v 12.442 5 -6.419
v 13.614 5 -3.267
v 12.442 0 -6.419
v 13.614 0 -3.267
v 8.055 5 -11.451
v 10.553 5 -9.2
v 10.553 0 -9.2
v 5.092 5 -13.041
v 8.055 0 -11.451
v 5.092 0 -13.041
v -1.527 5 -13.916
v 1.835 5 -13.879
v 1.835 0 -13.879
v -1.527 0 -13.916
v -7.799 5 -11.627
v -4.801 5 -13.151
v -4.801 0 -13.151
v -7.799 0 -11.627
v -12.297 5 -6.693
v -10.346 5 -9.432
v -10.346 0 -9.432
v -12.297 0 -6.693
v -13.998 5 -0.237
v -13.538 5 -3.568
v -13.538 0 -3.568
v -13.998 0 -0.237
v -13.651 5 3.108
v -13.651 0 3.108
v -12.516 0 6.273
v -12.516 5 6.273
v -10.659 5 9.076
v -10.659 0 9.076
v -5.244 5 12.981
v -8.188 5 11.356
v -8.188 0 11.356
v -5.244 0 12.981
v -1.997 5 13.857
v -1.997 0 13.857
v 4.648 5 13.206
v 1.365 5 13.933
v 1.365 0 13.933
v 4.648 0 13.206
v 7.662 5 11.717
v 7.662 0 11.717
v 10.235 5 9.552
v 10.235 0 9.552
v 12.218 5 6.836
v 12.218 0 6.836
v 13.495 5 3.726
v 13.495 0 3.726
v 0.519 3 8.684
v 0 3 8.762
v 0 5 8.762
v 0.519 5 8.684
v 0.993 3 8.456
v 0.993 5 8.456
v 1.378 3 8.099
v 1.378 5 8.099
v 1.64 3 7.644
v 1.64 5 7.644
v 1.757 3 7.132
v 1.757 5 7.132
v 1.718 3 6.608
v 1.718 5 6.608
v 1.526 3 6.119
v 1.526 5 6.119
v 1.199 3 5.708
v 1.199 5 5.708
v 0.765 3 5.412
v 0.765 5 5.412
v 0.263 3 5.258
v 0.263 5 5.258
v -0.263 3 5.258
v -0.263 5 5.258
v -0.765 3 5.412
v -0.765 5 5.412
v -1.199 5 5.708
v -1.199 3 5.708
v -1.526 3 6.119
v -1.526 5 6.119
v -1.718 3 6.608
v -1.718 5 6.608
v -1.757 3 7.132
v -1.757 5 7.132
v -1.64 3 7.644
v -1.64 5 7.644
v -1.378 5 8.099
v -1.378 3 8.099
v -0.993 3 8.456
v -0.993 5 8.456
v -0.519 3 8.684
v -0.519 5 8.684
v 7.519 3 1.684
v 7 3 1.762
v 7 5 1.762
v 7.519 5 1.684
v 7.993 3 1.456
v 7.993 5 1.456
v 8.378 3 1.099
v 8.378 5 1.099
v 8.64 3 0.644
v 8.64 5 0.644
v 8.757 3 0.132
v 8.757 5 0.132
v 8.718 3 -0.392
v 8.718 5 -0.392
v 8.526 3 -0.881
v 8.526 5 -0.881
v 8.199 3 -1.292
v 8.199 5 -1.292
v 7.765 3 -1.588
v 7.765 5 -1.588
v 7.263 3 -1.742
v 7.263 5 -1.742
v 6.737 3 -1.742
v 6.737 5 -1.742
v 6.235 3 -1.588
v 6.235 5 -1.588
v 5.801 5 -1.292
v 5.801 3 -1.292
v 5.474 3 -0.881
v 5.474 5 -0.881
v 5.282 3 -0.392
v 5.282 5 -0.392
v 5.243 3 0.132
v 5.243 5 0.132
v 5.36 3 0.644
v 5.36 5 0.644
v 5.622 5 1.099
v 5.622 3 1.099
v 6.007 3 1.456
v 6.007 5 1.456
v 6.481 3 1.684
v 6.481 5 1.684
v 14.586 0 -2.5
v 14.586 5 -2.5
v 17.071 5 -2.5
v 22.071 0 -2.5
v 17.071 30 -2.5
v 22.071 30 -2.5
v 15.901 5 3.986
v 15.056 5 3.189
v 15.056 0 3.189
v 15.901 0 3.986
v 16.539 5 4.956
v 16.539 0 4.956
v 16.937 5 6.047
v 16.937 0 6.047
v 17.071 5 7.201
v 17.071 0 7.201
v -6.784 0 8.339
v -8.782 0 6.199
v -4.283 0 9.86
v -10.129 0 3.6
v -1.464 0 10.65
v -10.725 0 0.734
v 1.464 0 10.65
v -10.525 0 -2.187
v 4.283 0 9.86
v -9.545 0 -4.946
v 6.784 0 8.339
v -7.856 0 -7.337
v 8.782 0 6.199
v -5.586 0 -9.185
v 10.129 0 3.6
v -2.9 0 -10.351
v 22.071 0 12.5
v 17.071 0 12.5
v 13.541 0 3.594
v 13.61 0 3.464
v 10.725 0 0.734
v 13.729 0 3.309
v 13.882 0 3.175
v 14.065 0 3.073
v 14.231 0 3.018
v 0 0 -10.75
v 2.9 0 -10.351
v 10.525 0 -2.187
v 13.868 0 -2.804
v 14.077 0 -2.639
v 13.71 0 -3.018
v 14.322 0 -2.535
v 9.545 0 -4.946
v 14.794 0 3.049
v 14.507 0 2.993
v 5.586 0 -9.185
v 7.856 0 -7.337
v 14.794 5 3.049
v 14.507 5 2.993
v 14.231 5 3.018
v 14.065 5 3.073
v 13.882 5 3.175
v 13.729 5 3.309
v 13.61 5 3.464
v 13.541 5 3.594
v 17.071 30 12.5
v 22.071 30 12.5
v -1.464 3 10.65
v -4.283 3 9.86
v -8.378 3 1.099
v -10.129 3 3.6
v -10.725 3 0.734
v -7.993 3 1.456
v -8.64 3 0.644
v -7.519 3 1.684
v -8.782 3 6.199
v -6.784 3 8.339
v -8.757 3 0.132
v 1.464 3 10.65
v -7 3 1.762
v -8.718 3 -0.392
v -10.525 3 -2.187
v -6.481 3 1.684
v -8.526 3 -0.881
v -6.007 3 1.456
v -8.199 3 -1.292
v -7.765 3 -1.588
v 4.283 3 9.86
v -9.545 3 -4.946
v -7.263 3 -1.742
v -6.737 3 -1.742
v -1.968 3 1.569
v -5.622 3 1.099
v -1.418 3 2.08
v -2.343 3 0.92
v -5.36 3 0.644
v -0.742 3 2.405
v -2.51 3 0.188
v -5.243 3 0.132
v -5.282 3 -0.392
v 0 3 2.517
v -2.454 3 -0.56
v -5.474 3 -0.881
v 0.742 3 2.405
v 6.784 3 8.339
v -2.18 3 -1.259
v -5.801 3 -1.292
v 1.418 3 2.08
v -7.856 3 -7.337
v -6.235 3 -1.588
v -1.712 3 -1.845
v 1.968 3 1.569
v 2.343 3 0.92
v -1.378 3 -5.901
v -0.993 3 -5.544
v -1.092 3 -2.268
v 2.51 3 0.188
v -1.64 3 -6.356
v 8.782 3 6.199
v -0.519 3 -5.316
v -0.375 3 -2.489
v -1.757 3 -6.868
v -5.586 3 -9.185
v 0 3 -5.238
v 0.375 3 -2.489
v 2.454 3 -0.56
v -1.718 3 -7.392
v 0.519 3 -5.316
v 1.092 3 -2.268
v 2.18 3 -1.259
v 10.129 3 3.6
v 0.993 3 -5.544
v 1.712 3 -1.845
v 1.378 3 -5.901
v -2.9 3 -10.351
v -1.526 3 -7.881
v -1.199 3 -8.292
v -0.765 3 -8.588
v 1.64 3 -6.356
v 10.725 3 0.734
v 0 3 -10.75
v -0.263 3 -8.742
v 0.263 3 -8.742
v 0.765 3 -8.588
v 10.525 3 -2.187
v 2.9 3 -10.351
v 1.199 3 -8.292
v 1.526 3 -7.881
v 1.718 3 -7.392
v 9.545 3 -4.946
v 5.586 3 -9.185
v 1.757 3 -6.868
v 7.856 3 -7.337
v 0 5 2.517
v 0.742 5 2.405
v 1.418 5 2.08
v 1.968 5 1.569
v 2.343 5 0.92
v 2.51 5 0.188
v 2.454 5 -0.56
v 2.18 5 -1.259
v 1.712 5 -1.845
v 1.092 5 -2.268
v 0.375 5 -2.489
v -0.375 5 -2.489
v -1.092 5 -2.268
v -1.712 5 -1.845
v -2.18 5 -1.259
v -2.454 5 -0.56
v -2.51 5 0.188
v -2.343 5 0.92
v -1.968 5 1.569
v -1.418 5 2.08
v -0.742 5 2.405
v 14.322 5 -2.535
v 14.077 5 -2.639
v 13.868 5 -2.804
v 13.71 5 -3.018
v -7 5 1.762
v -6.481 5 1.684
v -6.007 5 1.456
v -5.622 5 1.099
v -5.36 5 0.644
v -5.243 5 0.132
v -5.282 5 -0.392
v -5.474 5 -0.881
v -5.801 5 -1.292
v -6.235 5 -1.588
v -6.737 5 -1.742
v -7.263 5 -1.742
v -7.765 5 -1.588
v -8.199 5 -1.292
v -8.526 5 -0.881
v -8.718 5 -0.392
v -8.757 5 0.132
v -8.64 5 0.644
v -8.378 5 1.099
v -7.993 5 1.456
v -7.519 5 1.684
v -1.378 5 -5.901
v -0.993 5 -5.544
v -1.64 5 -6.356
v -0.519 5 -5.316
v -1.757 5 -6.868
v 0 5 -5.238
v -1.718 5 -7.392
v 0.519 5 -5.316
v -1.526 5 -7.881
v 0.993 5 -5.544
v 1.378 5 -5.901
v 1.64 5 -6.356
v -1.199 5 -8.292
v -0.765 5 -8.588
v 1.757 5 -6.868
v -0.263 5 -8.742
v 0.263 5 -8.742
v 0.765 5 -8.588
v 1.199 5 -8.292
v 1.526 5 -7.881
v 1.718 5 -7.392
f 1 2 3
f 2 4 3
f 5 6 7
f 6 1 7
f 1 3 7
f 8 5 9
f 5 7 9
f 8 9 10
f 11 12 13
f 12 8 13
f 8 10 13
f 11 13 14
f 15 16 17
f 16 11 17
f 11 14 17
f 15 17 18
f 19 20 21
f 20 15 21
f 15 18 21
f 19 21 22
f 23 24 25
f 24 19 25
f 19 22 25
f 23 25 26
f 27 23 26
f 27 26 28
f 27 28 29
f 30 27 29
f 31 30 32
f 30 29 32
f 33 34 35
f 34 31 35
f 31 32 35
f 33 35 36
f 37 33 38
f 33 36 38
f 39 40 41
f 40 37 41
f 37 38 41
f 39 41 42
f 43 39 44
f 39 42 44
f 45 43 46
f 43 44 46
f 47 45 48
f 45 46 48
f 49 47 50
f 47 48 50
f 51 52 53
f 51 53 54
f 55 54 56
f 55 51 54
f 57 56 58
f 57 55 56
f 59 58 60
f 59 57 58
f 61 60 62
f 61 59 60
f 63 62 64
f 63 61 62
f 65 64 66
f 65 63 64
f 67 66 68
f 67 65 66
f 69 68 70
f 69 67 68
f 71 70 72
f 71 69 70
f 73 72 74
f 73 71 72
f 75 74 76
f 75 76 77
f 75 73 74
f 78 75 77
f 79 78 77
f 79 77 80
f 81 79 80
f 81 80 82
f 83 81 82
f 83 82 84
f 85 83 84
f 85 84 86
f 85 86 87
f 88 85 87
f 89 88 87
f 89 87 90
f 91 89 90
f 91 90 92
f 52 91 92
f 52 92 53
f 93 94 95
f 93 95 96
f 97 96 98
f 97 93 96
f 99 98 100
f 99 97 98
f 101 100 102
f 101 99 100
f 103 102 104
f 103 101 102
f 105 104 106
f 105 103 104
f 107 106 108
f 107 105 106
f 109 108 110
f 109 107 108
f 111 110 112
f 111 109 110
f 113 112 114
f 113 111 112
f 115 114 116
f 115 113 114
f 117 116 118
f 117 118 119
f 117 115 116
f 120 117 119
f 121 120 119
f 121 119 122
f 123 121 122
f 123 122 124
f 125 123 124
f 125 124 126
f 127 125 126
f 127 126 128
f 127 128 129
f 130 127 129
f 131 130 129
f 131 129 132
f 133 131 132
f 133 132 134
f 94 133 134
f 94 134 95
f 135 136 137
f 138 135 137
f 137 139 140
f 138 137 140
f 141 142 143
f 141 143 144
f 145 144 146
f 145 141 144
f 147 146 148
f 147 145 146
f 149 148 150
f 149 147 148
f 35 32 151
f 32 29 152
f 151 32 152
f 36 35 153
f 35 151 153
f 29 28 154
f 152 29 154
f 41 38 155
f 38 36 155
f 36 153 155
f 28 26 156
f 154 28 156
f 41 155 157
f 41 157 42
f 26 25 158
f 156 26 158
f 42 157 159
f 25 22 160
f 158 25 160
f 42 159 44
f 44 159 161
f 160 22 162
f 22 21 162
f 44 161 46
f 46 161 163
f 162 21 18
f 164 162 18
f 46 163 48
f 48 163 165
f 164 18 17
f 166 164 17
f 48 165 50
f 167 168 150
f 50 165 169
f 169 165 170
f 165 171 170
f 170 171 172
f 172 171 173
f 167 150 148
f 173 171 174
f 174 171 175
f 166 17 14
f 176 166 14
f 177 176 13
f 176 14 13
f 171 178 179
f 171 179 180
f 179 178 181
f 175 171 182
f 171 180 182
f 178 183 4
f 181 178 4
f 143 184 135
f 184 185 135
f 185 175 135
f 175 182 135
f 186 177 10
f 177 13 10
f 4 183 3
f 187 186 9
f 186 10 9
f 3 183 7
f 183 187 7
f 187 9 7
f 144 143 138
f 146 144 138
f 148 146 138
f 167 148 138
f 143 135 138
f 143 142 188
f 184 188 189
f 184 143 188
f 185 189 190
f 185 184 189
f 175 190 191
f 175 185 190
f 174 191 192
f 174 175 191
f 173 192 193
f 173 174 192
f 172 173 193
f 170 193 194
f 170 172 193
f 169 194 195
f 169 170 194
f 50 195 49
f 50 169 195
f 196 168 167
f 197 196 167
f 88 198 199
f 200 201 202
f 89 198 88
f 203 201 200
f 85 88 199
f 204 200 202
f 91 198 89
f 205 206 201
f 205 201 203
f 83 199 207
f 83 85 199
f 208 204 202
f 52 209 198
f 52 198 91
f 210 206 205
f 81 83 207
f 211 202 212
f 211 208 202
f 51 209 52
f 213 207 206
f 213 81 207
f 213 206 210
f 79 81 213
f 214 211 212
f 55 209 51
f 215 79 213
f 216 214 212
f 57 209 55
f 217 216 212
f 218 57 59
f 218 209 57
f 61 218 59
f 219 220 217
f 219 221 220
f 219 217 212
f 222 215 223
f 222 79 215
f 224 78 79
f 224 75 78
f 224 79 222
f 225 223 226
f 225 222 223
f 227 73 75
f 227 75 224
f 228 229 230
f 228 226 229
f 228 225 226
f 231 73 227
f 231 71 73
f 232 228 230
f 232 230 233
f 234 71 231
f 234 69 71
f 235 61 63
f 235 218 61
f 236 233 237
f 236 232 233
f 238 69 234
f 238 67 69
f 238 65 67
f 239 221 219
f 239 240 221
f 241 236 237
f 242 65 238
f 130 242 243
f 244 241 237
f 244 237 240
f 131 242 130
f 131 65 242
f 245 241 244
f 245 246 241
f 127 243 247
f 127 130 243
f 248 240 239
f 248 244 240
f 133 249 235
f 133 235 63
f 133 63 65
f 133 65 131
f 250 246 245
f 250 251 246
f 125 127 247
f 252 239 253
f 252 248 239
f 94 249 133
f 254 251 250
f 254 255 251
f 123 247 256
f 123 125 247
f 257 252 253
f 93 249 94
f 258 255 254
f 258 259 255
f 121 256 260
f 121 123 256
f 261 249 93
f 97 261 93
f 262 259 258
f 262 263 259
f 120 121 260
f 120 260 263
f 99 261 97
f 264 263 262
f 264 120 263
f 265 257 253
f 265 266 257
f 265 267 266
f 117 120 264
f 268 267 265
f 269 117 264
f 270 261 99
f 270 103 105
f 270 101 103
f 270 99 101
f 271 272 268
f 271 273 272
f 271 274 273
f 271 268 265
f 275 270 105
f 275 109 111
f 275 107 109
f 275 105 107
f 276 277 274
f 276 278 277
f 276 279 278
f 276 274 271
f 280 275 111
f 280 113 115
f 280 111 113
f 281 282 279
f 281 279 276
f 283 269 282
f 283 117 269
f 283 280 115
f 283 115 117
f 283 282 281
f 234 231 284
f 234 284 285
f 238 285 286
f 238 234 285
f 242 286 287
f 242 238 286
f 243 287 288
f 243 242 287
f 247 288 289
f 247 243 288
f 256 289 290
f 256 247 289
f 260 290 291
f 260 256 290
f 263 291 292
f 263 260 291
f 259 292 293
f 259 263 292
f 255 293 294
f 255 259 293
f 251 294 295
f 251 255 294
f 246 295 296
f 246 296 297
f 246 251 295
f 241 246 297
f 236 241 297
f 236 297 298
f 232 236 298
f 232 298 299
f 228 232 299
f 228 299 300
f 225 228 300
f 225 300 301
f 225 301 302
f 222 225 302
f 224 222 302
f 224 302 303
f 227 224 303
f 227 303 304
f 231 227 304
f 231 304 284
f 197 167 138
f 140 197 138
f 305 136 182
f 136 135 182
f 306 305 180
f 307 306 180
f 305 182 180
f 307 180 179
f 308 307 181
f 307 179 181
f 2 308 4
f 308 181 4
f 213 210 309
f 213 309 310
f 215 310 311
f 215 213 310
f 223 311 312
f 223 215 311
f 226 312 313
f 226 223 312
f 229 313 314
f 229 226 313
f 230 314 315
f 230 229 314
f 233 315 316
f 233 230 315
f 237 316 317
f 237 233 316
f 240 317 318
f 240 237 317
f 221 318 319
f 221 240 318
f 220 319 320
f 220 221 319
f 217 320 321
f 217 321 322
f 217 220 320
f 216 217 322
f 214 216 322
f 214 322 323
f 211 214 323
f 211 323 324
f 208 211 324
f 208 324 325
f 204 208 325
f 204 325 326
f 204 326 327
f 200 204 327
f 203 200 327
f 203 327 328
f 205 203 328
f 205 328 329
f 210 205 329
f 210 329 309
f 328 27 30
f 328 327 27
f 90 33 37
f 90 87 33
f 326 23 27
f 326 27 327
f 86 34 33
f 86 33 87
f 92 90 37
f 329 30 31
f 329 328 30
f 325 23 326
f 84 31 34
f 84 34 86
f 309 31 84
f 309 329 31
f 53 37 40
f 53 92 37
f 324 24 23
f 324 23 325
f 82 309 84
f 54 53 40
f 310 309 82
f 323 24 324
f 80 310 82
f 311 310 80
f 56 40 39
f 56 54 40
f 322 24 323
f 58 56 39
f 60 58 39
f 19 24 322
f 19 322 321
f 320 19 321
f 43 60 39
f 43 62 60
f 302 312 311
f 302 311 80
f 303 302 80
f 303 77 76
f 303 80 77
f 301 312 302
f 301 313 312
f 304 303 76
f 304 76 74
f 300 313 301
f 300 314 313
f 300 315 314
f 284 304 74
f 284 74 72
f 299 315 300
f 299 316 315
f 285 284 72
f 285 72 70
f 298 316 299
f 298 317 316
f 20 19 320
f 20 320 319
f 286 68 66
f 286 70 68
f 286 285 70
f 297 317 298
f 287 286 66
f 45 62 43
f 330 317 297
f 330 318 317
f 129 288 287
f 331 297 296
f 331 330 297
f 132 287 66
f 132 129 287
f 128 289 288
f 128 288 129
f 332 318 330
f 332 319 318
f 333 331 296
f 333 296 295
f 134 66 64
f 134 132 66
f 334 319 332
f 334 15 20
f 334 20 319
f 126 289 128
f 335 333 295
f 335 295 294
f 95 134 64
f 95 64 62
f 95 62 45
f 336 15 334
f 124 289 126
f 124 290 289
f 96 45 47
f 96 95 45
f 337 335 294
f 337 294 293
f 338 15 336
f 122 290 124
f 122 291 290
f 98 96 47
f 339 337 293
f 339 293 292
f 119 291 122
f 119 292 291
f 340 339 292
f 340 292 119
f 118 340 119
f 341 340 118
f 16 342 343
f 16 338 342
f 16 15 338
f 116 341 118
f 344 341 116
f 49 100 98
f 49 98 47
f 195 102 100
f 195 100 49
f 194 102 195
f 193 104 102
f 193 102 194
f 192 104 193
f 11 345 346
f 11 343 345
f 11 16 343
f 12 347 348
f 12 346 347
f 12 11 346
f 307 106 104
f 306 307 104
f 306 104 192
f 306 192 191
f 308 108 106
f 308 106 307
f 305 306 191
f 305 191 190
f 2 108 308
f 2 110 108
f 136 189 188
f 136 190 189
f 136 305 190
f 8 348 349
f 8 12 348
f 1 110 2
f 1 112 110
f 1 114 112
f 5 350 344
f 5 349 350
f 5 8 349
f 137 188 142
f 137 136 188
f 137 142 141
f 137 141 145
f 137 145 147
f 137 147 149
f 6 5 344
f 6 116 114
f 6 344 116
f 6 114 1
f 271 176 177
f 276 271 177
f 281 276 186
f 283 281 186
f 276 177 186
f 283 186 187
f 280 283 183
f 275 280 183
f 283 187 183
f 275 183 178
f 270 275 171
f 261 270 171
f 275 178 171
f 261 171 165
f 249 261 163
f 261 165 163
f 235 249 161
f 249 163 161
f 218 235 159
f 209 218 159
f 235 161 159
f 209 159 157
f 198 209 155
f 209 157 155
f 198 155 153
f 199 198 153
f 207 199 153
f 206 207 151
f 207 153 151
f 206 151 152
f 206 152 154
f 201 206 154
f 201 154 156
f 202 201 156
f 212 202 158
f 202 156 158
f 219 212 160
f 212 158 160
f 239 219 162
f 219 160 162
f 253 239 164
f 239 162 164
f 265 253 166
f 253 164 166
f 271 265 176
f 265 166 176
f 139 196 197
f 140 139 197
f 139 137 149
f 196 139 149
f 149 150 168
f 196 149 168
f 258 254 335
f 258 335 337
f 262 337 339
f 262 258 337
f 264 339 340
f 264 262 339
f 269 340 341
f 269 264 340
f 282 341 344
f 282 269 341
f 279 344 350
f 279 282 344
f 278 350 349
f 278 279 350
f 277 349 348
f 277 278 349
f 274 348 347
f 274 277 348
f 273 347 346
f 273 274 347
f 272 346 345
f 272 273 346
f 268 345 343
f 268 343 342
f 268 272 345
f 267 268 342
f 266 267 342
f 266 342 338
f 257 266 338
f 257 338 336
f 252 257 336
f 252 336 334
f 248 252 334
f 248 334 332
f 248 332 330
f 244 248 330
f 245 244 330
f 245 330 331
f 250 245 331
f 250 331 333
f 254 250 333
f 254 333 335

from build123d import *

# Parameters (mm, degrees)
SKETCH1_R           = 14
SKETCH1_R_2         = 2.517260593
SKETCH1_R_3         = 1.762082415
BOSS_EXTRUDE1_DEPTH = 5
SKETCH4_W           = 12
SKETCH4_H           = 5
BOSS_EXTRUDE4_DEPTH = 5
SKETCH6_W           = 5
SKETCH6_H           = 15
BOSS_EXTRUDE5_DEPTH = 30
SKETCH8_R           = 10.75
CUT_EXTRUDE2_DEPTH  = 3
FILLET1_R           = 5
FILLET2_R           = 1


with BuildPart() as part:
    # Sketch1 → Boss-Extrude1 (new body)
    with BuildSketch(Plane(origin=(0, 0, 0), x_dir=(1, 0, 0), z_dir=(0, 1, 0))):
        with Locations(Location((0, 0, 0), (0, 0, 270))):
            Circle(SKETCH1_R)
        with Locations(Location((0, 0, 0), (0, 0, 270))):
            Circle(SKETCH1_R_2, mode=Mode.SUBTRACT)
        with Locations(Location((0, 7, 0), (0, 0, 270))):
            Circle(SKETCH1_R_3, mode=Mode.SUBTRACT)
        with Locations(Location((7, 0, 0), (0, 0, 270))):
            Circle(SKETCH1_R_3, mode=Mode.SUBTRACT)
        with Locations(Location((0, -7, 0), (0, 0, 270))):
            Circle(SKETCH1_R_3, mode=Mode.SUBTRACT)
        with Locations(Location((-7, 0, 0), (0, 0, 270))):
            Circle(SKETCH1_R_3, mode=Mode.SUBTRACT)
    extrude(amount=BOSS_EXTRUDE1_DEPTH)

    # Sketch4 → Boss-Extrude4 (add)
    with BuildSketch(Plane(origin=(0, 5, 0), x_dir=(1, 0, 0), z_dir=(0, 1, 0))):
        with Locations((16.071494653, 0)):
            Rectangle(SKETCH4_W, SKETCH4_H)
    extrude(amount=-BOSS_EXTRUDE4_DEPTH)

    # Sketch6 → Boss-Extrude5 (add)
    with BuildSketch(Plane.XZ):
        with Locations((19.571494653, 5)):
            Rectangle(SKETCH6_W, SKETCH6_H)
    extrude(amount=-BOSS_EXTRUDE5_DEPTH)

    # Sketch8 → Cut-Extrude2 (cut)
    with BuildSketch(Plane.XZ):
        with Locations(Location((0, 0, 0), (0, 0, 270))):
            Circle(SKETCH8_R)
    extrude(amount=-CUT_EXTRUDE2_DEPTH, mode=Mode.SUBTRACT)

    # Fillet1
    # the kernel refuses this fillet: 5 mm, written as the material it adds along each edge
    with BuildSketch(Plane(origin=(17.071494653, 5, 2.5), x_dir=(-1, 0, 0), z_dir=(0, -1, 0))) as fillet1_piece_1:
        with BuildLine():
            CenterArc((5, -4.700866603), FILLET1_R, 109.919316249, 70.080683751)
            Line((0, -4.700866603), (-0.1, -4.700866603))
            Line((-0.1, -4.700866603), (-0.1, 0))
            Line((-0.1, 0), (0, 0.1))
            ThreePointArc((0, 0.1), (1.648258669, 0.1), (3.262447686, 0.094017332))
            Line((3.262447686, 0.094017332), (3.296517339, 0))
        make_face()
    extrude(amount=5)

    # Fillet2
    fillet2_edges = [part.edges().sort_by_distance(p)[0] for p in [
        (13.774977314, 2.5, 2.5),
        (13.774977314, 2.5, -2.5),
    ]]
    fillet(fillet2_edges, radius=FILLET2_R)


solid = part.part
